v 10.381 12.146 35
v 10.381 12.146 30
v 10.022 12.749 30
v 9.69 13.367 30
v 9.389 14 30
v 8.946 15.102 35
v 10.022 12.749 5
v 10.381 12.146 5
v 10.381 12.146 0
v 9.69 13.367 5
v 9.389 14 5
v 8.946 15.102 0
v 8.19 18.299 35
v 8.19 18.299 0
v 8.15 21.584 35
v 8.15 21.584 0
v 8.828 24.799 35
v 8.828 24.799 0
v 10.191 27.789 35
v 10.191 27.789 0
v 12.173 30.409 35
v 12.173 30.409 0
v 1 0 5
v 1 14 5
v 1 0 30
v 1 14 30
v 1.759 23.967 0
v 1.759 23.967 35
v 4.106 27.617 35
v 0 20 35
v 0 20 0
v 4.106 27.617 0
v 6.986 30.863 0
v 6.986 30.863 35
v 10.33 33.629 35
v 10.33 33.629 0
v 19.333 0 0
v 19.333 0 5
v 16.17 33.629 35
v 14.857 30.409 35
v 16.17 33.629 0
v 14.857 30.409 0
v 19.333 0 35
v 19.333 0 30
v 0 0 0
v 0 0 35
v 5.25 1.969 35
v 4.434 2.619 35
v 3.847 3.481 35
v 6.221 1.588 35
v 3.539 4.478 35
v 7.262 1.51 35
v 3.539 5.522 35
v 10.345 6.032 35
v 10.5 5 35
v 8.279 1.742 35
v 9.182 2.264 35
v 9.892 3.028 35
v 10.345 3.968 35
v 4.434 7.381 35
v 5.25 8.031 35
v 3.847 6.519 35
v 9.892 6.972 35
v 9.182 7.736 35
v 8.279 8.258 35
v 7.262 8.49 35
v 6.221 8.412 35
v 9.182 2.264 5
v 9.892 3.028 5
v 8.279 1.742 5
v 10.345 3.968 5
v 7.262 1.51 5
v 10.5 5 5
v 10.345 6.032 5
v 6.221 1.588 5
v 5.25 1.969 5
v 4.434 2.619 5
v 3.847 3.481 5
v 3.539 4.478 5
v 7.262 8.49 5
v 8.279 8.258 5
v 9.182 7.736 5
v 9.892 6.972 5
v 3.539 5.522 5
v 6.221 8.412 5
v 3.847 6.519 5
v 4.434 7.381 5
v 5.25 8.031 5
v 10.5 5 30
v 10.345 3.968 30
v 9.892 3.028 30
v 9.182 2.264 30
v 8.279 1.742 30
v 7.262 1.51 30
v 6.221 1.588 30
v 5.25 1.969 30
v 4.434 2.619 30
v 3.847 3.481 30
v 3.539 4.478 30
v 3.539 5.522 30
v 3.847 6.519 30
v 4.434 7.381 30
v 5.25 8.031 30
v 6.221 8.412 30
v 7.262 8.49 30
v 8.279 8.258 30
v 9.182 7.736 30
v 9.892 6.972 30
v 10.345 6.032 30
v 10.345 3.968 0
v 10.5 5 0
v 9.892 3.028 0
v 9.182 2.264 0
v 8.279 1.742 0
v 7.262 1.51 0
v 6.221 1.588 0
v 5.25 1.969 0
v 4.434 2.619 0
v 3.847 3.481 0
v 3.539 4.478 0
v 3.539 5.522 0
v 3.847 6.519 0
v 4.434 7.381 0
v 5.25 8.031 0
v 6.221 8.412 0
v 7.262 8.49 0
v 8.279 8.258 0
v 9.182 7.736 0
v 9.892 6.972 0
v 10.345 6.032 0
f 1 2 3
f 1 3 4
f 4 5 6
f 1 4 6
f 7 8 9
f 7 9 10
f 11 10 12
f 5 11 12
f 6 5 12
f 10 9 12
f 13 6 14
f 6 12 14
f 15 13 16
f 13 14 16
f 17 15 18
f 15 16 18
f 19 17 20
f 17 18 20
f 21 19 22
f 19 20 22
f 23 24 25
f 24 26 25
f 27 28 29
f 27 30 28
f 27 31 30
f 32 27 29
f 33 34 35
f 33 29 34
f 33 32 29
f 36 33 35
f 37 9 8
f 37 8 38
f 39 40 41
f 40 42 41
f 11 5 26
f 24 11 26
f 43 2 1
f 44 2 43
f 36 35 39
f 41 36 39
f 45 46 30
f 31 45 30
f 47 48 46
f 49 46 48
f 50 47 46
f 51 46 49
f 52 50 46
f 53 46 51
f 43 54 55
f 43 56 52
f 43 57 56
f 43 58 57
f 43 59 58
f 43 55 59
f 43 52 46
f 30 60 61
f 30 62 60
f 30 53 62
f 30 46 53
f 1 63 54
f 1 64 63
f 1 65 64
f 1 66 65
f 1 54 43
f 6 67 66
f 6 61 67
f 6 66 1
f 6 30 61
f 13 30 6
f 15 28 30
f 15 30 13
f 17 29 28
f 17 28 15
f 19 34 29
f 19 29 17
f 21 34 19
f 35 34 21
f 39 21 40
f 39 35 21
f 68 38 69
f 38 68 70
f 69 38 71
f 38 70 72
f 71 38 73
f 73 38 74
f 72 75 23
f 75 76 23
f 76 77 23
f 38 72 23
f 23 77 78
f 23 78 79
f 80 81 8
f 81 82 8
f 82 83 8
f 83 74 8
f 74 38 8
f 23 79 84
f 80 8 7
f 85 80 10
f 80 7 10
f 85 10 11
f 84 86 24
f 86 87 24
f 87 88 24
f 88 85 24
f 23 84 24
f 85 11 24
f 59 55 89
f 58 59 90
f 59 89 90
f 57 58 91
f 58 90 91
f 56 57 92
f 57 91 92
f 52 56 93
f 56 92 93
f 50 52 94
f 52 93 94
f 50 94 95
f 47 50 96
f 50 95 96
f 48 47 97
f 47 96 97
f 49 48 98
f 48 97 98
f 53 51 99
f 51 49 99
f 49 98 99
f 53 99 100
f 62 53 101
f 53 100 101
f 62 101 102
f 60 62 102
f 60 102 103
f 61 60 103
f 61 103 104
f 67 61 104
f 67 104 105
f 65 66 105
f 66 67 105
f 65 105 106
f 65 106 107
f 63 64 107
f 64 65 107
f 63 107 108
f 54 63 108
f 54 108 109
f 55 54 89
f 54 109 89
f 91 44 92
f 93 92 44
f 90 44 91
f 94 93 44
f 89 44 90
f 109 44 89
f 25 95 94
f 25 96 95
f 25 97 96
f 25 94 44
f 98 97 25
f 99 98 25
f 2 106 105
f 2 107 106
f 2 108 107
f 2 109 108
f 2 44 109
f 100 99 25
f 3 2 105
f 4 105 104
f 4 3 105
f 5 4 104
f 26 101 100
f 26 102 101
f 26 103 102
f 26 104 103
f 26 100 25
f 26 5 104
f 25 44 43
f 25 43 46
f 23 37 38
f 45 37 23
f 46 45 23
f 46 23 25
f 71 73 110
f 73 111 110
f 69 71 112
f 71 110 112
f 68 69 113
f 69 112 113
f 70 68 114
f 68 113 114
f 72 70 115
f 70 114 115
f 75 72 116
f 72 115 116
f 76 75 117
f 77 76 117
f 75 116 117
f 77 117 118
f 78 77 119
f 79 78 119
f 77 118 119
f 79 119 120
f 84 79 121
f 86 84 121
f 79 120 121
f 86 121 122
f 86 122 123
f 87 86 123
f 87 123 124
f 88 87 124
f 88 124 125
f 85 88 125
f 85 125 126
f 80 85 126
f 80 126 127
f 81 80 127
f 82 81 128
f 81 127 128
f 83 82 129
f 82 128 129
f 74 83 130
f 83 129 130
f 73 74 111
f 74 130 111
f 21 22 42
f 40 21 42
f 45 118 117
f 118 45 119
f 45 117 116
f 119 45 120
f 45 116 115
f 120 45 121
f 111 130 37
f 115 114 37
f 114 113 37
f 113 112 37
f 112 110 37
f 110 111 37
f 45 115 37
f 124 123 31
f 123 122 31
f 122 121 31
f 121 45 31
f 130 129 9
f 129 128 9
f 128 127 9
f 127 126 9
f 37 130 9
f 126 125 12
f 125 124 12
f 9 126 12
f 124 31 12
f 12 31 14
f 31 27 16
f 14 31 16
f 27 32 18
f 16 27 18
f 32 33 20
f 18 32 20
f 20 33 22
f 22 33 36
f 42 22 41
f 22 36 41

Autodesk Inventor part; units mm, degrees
ref_plane "YZ Plane" through (0, 0, 0) normal (1, 0, 0) x (0, 1, 0)
ref_plane "XZ Plane" through (0, 0, 0) normal (0, 1, 0) x (-1, 0, 0)
sketch "Sketch1" plane through (0, 0, 0) normal (0, 0, 1) x (1, 0, 0)
  line L0 (0, 0) -> (0, 20)
  arc A0 (10.3297, 33.6293) -> (0, 20) centre (26.5688, 10.5925) ccw
  line L1 (10.3297, 33.6293) -> (13.2894, 33.6293)
  arc A1 (12.1727, 30.4088) -> (10.3814, 12.1465) centre (23.0461, 20.1232) ccw
  line L2 (10.3814, 12.1465) -> (19.3334, 0)
  line L3 (19.3334, 0) -> (0, 0)
  line L4 (12.1727, 30.4088) -> (14.8574, 30.4088)
  line L5 (14.8574, 30.4088) -> (16.1699, 33.6293)
  line L6 (16.1699, 33.6293) -> (13.2894, 33.6293)
  circle A2 centre (7, 5) radius 3.5
  dimension "d0" = 20
  dimension "d1" = 7
  dimension "d2" = 14.9674
  dimension "d3" = 28.1852
  dimension "d4" = 67.827
  dimension "d5" = 10.2856
  dimension "d6" = 7
  dimension "d7" = 5
  dimension "d8" = 53.61
  dimension "d9" = 3.2206
extrude "Extrusion1" add sketch "Sketch1" along normal blind 35
ref_plane "Work Plane1" through (0, 0, 17.5) normal (0, 0, -1) x (-1, 0, 0)
sketch "Sketch2" plane through (0, 0, 17.5) normal (0, 0, -1) x (-1, 0, 0)
  line L0 (-1, 0) -> (-21, 0)
  line L1 (-21, 0) -> (-21, 14)
  line L2 (-21, 14) -> (-1, 14)
  line L3 (-1, 14) -> (-1, 0)
  line L4 (0, 0) -> (-25.0349, 0) construction
  dimension "d12" = 20
  dimension "d13" = 14
  dimension "d15" = 1
extrude "Extrusion2" cut sketch "Sketch2" along normal mid plane 25
